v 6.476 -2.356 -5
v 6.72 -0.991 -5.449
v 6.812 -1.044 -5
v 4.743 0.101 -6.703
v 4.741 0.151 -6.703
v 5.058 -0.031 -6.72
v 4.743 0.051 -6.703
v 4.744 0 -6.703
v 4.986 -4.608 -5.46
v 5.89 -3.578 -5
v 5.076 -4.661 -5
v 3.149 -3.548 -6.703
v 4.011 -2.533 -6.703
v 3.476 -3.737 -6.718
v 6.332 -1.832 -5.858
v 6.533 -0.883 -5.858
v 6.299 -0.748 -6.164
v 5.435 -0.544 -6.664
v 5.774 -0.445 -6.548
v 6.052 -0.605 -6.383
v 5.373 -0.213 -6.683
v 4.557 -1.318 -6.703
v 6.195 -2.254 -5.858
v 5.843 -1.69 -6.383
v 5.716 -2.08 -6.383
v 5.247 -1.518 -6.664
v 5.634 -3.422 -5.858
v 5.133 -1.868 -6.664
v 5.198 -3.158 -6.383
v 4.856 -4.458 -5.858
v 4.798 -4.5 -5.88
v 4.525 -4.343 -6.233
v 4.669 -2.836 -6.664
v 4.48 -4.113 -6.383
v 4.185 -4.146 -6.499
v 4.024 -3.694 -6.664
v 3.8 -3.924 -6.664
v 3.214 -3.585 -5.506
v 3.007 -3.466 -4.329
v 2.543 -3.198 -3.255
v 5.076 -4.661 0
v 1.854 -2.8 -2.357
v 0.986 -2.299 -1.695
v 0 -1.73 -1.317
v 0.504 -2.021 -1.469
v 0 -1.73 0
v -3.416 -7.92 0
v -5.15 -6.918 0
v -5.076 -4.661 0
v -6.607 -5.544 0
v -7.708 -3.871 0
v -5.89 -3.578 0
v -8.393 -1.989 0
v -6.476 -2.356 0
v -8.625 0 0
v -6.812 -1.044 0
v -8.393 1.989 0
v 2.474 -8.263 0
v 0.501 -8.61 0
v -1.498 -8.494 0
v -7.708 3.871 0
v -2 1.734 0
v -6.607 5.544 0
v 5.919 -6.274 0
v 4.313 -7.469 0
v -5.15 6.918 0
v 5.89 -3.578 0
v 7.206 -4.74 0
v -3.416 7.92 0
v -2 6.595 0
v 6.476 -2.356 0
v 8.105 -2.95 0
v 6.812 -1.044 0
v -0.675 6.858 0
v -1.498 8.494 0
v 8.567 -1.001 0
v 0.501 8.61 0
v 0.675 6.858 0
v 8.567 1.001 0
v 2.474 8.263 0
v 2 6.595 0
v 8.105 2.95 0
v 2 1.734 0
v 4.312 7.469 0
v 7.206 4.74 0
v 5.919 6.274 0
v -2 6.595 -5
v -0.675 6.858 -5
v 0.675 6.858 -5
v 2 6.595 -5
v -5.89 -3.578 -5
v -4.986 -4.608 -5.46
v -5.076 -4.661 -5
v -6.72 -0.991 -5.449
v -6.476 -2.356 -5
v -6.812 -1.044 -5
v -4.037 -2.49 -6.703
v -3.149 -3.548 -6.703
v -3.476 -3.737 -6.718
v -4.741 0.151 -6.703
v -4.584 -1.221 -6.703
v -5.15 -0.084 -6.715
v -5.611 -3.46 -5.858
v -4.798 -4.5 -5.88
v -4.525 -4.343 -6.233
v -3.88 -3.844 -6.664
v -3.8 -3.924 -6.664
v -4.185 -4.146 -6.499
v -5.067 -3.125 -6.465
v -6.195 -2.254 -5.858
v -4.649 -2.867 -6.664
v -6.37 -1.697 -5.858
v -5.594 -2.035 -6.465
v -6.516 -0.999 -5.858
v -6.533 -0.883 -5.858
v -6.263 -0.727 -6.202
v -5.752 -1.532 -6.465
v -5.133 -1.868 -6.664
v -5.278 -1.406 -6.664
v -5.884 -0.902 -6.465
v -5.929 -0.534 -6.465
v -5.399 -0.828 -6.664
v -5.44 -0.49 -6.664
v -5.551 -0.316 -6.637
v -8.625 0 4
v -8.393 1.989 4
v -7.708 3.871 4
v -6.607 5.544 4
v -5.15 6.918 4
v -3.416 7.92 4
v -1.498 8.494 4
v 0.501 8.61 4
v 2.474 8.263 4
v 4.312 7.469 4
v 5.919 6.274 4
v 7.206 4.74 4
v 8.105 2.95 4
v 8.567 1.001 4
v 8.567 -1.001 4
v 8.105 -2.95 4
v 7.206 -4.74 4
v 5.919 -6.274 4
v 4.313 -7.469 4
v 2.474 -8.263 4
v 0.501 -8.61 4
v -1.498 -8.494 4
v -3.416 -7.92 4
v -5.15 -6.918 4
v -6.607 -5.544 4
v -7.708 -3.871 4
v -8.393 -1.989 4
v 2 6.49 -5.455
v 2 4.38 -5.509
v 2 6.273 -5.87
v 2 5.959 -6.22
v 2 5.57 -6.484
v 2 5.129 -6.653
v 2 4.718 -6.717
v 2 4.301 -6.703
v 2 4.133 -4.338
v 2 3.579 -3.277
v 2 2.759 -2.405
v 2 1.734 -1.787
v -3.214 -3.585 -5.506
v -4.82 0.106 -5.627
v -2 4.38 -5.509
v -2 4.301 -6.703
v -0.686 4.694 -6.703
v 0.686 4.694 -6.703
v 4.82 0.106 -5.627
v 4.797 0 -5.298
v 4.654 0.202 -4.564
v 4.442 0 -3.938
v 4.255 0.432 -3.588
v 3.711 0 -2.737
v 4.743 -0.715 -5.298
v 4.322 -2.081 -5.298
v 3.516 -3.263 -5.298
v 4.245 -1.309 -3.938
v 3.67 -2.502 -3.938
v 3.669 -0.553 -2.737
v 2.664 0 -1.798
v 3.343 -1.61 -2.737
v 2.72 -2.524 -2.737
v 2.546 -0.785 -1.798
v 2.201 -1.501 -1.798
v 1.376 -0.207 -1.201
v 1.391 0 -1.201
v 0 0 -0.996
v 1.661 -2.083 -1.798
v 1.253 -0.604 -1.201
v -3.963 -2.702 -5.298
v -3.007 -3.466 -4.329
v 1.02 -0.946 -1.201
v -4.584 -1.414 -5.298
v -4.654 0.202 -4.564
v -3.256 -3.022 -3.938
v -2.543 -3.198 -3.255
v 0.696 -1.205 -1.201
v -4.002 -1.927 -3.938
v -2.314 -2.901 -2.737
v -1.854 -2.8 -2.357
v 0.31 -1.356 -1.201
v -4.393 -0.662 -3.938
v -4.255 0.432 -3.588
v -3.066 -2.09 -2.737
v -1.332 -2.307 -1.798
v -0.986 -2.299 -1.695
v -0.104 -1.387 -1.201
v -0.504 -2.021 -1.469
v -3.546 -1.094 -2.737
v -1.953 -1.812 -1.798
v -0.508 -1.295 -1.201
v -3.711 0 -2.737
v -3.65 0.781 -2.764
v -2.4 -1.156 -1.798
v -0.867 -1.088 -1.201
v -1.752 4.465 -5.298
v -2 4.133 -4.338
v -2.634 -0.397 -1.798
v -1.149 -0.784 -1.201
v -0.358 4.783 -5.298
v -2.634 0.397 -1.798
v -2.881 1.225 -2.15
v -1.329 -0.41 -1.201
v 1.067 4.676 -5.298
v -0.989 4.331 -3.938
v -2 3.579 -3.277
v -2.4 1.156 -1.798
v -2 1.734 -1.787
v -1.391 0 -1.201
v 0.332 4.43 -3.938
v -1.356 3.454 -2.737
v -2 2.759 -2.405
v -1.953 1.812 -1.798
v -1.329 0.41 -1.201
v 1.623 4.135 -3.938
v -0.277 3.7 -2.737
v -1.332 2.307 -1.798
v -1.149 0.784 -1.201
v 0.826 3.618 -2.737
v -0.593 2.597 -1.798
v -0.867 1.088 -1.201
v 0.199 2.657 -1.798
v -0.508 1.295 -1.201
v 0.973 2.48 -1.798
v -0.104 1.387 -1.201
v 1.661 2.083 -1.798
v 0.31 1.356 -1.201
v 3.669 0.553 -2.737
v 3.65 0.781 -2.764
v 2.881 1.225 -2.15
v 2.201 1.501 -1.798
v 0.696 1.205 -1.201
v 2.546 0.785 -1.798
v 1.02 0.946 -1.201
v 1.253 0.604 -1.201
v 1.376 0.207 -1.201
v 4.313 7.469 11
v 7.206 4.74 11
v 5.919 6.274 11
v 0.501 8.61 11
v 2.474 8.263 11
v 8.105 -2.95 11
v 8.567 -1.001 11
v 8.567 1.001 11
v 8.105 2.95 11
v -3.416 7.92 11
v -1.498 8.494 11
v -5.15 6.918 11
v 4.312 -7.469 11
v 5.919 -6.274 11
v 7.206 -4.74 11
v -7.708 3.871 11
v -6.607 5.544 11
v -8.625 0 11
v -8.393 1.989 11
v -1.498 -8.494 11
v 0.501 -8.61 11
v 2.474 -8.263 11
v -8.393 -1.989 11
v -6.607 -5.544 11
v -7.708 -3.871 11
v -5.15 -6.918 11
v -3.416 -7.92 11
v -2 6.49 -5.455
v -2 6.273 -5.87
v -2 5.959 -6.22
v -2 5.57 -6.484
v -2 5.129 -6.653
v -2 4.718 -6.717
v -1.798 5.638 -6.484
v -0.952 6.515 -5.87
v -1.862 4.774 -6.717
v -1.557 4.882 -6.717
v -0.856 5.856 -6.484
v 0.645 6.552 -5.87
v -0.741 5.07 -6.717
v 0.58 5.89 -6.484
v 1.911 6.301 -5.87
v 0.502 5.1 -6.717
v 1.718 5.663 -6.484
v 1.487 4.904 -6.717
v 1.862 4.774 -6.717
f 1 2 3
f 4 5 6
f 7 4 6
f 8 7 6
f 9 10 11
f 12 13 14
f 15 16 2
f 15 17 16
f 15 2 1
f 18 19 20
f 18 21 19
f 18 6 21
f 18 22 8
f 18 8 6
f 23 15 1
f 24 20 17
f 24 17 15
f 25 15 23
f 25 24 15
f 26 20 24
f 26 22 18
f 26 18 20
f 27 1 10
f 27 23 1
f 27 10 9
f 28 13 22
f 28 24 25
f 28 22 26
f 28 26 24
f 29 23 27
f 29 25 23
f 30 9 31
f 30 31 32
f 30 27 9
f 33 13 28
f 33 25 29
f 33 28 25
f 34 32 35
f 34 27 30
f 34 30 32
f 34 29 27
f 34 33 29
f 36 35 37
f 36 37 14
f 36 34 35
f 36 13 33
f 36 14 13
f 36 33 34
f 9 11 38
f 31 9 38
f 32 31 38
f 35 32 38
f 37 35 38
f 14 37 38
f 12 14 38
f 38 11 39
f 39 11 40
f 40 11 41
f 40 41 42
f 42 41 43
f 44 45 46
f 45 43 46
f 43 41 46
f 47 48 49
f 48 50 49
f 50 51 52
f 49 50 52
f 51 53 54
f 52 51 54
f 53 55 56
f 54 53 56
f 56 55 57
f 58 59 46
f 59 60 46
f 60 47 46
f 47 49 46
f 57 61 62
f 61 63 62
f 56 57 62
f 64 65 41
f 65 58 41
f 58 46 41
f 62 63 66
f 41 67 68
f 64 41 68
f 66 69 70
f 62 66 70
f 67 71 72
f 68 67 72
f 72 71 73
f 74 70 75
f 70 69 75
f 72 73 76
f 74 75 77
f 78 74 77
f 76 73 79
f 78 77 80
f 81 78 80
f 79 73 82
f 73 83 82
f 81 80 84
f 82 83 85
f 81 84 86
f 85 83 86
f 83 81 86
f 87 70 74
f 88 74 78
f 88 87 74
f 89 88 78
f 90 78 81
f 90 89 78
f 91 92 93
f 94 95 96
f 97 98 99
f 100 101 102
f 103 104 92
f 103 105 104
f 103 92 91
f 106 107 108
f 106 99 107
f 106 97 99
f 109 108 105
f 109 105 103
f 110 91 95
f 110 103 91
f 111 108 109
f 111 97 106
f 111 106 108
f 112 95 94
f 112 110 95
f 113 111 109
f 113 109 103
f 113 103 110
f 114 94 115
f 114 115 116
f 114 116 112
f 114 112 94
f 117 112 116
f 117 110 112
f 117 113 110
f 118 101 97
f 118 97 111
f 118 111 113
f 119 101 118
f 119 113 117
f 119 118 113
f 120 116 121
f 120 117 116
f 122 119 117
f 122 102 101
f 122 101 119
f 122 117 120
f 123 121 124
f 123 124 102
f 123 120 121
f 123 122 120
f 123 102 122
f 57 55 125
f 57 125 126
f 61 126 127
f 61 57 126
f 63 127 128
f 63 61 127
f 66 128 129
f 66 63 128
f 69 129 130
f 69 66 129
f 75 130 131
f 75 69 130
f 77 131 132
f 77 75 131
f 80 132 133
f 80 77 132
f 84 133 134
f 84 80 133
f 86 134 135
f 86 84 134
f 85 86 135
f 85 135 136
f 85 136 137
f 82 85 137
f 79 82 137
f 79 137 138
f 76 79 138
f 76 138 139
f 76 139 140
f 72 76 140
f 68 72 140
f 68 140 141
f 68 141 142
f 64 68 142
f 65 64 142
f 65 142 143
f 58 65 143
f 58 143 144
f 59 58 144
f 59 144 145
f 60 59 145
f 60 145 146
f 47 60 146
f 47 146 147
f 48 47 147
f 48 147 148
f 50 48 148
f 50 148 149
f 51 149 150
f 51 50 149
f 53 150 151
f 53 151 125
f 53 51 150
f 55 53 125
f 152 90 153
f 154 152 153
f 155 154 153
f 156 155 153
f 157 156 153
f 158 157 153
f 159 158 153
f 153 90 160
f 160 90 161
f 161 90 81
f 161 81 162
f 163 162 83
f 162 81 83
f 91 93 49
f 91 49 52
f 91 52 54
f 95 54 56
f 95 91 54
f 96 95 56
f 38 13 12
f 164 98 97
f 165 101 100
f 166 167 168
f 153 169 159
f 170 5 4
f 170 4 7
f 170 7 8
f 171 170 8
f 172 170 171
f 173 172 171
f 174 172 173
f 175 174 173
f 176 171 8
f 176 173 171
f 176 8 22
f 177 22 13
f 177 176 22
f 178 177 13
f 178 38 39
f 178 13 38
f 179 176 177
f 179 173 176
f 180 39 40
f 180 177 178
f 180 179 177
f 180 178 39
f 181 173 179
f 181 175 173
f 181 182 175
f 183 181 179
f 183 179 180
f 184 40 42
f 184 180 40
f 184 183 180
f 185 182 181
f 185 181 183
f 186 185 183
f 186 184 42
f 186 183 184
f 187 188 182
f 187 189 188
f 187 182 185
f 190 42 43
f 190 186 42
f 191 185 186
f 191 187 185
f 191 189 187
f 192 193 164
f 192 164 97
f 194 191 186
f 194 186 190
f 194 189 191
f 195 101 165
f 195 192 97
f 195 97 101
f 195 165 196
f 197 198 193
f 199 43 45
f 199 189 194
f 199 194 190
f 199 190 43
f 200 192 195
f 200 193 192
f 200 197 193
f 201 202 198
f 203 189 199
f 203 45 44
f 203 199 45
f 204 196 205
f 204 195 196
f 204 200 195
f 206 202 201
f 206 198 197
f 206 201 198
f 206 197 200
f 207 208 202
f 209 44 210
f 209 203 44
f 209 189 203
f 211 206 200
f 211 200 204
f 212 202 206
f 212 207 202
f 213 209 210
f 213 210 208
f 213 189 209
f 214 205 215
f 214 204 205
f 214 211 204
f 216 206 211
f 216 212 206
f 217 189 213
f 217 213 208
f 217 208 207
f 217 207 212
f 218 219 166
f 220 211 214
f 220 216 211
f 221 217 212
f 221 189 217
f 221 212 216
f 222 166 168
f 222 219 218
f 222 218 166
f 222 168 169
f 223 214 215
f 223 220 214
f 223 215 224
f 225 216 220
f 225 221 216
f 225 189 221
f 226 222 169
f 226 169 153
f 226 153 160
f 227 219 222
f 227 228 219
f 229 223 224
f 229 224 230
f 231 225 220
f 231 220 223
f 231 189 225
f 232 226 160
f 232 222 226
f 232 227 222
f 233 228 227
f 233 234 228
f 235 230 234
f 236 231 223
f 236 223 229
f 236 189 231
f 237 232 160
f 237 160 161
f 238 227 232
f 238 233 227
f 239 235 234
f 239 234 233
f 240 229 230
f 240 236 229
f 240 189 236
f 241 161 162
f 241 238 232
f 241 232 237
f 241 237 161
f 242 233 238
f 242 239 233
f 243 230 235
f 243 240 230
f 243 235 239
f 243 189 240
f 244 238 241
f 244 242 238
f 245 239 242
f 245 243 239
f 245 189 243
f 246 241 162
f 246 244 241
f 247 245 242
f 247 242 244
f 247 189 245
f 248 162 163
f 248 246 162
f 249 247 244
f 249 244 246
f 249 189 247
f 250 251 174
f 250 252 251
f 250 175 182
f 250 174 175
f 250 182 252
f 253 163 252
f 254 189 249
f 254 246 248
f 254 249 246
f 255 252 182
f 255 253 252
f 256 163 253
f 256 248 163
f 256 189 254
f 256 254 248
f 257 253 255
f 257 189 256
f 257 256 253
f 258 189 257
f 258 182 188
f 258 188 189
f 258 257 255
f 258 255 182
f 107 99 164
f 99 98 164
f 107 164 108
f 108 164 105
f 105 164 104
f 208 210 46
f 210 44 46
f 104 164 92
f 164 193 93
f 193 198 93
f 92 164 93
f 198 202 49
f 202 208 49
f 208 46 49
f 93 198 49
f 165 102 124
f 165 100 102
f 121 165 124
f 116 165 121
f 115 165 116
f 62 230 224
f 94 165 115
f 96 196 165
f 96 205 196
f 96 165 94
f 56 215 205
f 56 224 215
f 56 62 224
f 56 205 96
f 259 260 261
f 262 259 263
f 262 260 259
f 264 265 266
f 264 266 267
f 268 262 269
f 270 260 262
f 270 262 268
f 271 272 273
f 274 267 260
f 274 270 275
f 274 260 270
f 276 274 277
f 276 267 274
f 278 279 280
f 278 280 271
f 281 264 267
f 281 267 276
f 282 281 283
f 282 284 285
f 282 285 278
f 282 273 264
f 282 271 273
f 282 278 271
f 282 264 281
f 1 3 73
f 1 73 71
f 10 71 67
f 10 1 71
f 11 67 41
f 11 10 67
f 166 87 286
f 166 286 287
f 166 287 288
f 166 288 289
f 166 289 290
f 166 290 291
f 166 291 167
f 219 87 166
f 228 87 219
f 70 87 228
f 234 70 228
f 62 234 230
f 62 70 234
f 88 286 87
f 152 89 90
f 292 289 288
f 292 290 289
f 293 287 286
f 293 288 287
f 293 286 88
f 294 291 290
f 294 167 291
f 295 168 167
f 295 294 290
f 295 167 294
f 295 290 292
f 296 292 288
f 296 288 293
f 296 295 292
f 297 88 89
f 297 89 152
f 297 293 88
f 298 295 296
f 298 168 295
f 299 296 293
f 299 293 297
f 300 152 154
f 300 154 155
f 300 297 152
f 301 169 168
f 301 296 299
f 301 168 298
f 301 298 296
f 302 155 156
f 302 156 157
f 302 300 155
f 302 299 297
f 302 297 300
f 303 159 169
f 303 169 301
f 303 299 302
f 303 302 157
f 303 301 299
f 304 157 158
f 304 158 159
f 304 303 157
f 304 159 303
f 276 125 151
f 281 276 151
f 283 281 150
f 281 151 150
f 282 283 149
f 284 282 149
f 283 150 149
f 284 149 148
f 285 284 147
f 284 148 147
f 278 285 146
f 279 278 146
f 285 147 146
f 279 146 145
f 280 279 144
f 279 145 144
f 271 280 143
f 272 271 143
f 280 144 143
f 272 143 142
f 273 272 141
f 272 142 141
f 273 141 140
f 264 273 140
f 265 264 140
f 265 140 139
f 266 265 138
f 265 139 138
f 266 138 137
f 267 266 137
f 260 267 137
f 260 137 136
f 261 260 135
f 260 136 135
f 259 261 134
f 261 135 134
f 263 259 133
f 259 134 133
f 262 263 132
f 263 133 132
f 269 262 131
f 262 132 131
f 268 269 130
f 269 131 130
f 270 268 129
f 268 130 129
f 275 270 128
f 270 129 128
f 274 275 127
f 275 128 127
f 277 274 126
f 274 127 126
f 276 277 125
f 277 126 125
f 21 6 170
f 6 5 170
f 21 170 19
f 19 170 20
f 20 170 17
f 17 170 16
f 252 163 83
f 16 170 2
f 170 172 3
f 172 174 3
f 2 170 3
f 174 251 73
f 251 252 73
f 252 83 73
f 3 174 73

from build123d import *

# Parameters (mm, degrees)
CORTE_EXTRUS_O1_DEPTH    = 12.838758968
ESBO_O4_R                = 1.6
RESSALTO_EXTRUS_O1_DEPTH = 4
ESBO_O5_W                = 57.361933027
ESBO_O5_H                = 29.217059345
ESBO_O5_R                = 10
CORTE_EXTRUS_O2_DEPTH    = 10
ESBO_O6_R                = 10
ESBO_O6_R_2              = 8.625
CORTE_EXTRUS_O3_DEPTH    = 10
ESBO_O8_R                = 8.625
RESSALTO_EXTRUS_O2_DEPTH = 7


with BuildPart() as part:
    # Esboço1 → Revolução1 (revolve)
    with BuildSketch(Plane(origin=(0, 0, 0), x_dir=(1, 0, 0), z_dir=(0, 1, 0))):
        with BuildLine():
            Line((0, 0), (6.891534421, 0))
            Line((6.891534421, 0), (6.891534421, 5))
            ThreePointArc((6.891534421, 5), (6.180613943, 6.309516298), (4.743586175, 6.703460527))
            ThreePointArc((4.743586175, 6.703460527), (3.710745118, 2.736851933), (0, 0.995842151))
            Line((0, 0.995842151), (0, 0))
        make_face()
    revolve(axis=Axis((0, 0, 0), (0, 0, -1)))

    # Esboço3 → Corte-extrusão1 (cut, through all)
    with BuildSketch(Plane.XY):
        with BuildLine():
            Line((-2, 19.326317369), (-2, 1.734101615))
            Line((-2, 1.734101615), (-17.937282026, -7.467292453))
            ThreePointArc((-17.937282026, -7.467292453), (-16.698748021, 9.932691356), (-2, 19.326317369))
        make_face()
        with BuildLine():
            Line((2, 19.326317369), (2, 1.734101615))
            Line((2, 1.734101615), (17.937282026, -7.467292453))
            ThreePointArc((17.937282026, -7.467292453), (16.698748021, 9.932691356), (2, 19.326317369))
        make_face()
        with BuildLine():
            Line((0, -1.73), (-16.027252382, -10.983338477))
            ThreePointArc((-16.027252382, -10.983338477), (0, -19.429527607), (16.027252382, -10.983338477))
            Line((16.027252382, -10.983338477), (0, -1.73))
        make_face()
    extrude(amount=-CORTE_EXTRUS_O1_DEPTH, mode=Mode.SUBTRACT)

    # Esboço4 → Ressalto-extrusão1 (add)
    with BuildSketch(Plane.XY):
        with BuildLine():
            ThreePointArc((-6.64, -7.477325725), (0, -10), (6.64, -7.477325725))
            ThreePointArc((6.64, -7.477325725), (12.553949294, -4.249302623), (19.284210526, -3.935434592))
            ThreePointArc((19.284210526, -3.935434592), (24, 0), (19.284210526, 3.935434592))
            ThreePointArc((19.284210526, 3.935434592), (12.553949294, 4.249302623), (6.64, 7.477325725))
            ThreePointArc((6.64, 7.477325725), (0, 10), (-6.64, 7.477325725))
            ThreePointArc((-6.64, 7.477325725), (-12.553949294, 4.249302623), (-19.284210526, 3.935434592))
            ThreePointArc((-19.284210526, 3.935434592), (-24, 0), (-19.284210526, -3.935434592))
            ThreePointArc((-19.284210526, -3.935434592), (-12.553949294, -4.249302623), (-6.64, -7.477325725))
        make_face()
        with Locations((20, 0)):
            Circle(ESBO_O4_R, mode=Mode.SUBTRACT)
        with Locations((-20, 0)):
            Circle(ESBO_O4_R, mode=Mode.SUBTRACT)
    extrude(amount=RESSALTO_EXTRUS_O1_DEPTH)

    # Esboço5 → Corte-extrusão2 (cut)
    with BuildSketch(Plane(origin=(0, 0, 0), x_dir=(-1, 0, 0), z_dir=(0, 0, -1))):
        with Locations((1.250708993, 0.03640394)):
            Rectangle(ESBO_O5_W, ESBO_O5_H)
        with Locations(Location((0, 0, 0), (0, 0, 180))):
            Circle(ESBO_O5_R, mode=Mode.SUBTRACT)
    extrude(amount=-CORTE_EXTRUS_O2_DEPTH, mode=Mode.SUBTRACT)

    # Esboço6 → Corte-extrusão3 (cut)
    with BuildSketch(Plane(origin=(0, 0, 0), x_dir=(-1, 0, 0), z_dir=(0, 0, -1))):
        Circle(ESBO_O6_R)
        Circle(ESBO_O6_R_2, mode=Mode.SUBTRACT)
    extrude(amount=-CORTE_EXTRUS_O3_DEPTH, mode=Mode.SUBTRACT)

    # Esboço8 → Ressalto-extrusão2 (add)
    with BuildSketch(Plane.XY.offset(4)):
        with Locations(Location((0, 0, 0), (0, 0, 180))):
            Circle(ESBO_O8_R)
    extrude(amount=RESSALTO_EXTRUS_O2_DEPTH)


solid = part.part
